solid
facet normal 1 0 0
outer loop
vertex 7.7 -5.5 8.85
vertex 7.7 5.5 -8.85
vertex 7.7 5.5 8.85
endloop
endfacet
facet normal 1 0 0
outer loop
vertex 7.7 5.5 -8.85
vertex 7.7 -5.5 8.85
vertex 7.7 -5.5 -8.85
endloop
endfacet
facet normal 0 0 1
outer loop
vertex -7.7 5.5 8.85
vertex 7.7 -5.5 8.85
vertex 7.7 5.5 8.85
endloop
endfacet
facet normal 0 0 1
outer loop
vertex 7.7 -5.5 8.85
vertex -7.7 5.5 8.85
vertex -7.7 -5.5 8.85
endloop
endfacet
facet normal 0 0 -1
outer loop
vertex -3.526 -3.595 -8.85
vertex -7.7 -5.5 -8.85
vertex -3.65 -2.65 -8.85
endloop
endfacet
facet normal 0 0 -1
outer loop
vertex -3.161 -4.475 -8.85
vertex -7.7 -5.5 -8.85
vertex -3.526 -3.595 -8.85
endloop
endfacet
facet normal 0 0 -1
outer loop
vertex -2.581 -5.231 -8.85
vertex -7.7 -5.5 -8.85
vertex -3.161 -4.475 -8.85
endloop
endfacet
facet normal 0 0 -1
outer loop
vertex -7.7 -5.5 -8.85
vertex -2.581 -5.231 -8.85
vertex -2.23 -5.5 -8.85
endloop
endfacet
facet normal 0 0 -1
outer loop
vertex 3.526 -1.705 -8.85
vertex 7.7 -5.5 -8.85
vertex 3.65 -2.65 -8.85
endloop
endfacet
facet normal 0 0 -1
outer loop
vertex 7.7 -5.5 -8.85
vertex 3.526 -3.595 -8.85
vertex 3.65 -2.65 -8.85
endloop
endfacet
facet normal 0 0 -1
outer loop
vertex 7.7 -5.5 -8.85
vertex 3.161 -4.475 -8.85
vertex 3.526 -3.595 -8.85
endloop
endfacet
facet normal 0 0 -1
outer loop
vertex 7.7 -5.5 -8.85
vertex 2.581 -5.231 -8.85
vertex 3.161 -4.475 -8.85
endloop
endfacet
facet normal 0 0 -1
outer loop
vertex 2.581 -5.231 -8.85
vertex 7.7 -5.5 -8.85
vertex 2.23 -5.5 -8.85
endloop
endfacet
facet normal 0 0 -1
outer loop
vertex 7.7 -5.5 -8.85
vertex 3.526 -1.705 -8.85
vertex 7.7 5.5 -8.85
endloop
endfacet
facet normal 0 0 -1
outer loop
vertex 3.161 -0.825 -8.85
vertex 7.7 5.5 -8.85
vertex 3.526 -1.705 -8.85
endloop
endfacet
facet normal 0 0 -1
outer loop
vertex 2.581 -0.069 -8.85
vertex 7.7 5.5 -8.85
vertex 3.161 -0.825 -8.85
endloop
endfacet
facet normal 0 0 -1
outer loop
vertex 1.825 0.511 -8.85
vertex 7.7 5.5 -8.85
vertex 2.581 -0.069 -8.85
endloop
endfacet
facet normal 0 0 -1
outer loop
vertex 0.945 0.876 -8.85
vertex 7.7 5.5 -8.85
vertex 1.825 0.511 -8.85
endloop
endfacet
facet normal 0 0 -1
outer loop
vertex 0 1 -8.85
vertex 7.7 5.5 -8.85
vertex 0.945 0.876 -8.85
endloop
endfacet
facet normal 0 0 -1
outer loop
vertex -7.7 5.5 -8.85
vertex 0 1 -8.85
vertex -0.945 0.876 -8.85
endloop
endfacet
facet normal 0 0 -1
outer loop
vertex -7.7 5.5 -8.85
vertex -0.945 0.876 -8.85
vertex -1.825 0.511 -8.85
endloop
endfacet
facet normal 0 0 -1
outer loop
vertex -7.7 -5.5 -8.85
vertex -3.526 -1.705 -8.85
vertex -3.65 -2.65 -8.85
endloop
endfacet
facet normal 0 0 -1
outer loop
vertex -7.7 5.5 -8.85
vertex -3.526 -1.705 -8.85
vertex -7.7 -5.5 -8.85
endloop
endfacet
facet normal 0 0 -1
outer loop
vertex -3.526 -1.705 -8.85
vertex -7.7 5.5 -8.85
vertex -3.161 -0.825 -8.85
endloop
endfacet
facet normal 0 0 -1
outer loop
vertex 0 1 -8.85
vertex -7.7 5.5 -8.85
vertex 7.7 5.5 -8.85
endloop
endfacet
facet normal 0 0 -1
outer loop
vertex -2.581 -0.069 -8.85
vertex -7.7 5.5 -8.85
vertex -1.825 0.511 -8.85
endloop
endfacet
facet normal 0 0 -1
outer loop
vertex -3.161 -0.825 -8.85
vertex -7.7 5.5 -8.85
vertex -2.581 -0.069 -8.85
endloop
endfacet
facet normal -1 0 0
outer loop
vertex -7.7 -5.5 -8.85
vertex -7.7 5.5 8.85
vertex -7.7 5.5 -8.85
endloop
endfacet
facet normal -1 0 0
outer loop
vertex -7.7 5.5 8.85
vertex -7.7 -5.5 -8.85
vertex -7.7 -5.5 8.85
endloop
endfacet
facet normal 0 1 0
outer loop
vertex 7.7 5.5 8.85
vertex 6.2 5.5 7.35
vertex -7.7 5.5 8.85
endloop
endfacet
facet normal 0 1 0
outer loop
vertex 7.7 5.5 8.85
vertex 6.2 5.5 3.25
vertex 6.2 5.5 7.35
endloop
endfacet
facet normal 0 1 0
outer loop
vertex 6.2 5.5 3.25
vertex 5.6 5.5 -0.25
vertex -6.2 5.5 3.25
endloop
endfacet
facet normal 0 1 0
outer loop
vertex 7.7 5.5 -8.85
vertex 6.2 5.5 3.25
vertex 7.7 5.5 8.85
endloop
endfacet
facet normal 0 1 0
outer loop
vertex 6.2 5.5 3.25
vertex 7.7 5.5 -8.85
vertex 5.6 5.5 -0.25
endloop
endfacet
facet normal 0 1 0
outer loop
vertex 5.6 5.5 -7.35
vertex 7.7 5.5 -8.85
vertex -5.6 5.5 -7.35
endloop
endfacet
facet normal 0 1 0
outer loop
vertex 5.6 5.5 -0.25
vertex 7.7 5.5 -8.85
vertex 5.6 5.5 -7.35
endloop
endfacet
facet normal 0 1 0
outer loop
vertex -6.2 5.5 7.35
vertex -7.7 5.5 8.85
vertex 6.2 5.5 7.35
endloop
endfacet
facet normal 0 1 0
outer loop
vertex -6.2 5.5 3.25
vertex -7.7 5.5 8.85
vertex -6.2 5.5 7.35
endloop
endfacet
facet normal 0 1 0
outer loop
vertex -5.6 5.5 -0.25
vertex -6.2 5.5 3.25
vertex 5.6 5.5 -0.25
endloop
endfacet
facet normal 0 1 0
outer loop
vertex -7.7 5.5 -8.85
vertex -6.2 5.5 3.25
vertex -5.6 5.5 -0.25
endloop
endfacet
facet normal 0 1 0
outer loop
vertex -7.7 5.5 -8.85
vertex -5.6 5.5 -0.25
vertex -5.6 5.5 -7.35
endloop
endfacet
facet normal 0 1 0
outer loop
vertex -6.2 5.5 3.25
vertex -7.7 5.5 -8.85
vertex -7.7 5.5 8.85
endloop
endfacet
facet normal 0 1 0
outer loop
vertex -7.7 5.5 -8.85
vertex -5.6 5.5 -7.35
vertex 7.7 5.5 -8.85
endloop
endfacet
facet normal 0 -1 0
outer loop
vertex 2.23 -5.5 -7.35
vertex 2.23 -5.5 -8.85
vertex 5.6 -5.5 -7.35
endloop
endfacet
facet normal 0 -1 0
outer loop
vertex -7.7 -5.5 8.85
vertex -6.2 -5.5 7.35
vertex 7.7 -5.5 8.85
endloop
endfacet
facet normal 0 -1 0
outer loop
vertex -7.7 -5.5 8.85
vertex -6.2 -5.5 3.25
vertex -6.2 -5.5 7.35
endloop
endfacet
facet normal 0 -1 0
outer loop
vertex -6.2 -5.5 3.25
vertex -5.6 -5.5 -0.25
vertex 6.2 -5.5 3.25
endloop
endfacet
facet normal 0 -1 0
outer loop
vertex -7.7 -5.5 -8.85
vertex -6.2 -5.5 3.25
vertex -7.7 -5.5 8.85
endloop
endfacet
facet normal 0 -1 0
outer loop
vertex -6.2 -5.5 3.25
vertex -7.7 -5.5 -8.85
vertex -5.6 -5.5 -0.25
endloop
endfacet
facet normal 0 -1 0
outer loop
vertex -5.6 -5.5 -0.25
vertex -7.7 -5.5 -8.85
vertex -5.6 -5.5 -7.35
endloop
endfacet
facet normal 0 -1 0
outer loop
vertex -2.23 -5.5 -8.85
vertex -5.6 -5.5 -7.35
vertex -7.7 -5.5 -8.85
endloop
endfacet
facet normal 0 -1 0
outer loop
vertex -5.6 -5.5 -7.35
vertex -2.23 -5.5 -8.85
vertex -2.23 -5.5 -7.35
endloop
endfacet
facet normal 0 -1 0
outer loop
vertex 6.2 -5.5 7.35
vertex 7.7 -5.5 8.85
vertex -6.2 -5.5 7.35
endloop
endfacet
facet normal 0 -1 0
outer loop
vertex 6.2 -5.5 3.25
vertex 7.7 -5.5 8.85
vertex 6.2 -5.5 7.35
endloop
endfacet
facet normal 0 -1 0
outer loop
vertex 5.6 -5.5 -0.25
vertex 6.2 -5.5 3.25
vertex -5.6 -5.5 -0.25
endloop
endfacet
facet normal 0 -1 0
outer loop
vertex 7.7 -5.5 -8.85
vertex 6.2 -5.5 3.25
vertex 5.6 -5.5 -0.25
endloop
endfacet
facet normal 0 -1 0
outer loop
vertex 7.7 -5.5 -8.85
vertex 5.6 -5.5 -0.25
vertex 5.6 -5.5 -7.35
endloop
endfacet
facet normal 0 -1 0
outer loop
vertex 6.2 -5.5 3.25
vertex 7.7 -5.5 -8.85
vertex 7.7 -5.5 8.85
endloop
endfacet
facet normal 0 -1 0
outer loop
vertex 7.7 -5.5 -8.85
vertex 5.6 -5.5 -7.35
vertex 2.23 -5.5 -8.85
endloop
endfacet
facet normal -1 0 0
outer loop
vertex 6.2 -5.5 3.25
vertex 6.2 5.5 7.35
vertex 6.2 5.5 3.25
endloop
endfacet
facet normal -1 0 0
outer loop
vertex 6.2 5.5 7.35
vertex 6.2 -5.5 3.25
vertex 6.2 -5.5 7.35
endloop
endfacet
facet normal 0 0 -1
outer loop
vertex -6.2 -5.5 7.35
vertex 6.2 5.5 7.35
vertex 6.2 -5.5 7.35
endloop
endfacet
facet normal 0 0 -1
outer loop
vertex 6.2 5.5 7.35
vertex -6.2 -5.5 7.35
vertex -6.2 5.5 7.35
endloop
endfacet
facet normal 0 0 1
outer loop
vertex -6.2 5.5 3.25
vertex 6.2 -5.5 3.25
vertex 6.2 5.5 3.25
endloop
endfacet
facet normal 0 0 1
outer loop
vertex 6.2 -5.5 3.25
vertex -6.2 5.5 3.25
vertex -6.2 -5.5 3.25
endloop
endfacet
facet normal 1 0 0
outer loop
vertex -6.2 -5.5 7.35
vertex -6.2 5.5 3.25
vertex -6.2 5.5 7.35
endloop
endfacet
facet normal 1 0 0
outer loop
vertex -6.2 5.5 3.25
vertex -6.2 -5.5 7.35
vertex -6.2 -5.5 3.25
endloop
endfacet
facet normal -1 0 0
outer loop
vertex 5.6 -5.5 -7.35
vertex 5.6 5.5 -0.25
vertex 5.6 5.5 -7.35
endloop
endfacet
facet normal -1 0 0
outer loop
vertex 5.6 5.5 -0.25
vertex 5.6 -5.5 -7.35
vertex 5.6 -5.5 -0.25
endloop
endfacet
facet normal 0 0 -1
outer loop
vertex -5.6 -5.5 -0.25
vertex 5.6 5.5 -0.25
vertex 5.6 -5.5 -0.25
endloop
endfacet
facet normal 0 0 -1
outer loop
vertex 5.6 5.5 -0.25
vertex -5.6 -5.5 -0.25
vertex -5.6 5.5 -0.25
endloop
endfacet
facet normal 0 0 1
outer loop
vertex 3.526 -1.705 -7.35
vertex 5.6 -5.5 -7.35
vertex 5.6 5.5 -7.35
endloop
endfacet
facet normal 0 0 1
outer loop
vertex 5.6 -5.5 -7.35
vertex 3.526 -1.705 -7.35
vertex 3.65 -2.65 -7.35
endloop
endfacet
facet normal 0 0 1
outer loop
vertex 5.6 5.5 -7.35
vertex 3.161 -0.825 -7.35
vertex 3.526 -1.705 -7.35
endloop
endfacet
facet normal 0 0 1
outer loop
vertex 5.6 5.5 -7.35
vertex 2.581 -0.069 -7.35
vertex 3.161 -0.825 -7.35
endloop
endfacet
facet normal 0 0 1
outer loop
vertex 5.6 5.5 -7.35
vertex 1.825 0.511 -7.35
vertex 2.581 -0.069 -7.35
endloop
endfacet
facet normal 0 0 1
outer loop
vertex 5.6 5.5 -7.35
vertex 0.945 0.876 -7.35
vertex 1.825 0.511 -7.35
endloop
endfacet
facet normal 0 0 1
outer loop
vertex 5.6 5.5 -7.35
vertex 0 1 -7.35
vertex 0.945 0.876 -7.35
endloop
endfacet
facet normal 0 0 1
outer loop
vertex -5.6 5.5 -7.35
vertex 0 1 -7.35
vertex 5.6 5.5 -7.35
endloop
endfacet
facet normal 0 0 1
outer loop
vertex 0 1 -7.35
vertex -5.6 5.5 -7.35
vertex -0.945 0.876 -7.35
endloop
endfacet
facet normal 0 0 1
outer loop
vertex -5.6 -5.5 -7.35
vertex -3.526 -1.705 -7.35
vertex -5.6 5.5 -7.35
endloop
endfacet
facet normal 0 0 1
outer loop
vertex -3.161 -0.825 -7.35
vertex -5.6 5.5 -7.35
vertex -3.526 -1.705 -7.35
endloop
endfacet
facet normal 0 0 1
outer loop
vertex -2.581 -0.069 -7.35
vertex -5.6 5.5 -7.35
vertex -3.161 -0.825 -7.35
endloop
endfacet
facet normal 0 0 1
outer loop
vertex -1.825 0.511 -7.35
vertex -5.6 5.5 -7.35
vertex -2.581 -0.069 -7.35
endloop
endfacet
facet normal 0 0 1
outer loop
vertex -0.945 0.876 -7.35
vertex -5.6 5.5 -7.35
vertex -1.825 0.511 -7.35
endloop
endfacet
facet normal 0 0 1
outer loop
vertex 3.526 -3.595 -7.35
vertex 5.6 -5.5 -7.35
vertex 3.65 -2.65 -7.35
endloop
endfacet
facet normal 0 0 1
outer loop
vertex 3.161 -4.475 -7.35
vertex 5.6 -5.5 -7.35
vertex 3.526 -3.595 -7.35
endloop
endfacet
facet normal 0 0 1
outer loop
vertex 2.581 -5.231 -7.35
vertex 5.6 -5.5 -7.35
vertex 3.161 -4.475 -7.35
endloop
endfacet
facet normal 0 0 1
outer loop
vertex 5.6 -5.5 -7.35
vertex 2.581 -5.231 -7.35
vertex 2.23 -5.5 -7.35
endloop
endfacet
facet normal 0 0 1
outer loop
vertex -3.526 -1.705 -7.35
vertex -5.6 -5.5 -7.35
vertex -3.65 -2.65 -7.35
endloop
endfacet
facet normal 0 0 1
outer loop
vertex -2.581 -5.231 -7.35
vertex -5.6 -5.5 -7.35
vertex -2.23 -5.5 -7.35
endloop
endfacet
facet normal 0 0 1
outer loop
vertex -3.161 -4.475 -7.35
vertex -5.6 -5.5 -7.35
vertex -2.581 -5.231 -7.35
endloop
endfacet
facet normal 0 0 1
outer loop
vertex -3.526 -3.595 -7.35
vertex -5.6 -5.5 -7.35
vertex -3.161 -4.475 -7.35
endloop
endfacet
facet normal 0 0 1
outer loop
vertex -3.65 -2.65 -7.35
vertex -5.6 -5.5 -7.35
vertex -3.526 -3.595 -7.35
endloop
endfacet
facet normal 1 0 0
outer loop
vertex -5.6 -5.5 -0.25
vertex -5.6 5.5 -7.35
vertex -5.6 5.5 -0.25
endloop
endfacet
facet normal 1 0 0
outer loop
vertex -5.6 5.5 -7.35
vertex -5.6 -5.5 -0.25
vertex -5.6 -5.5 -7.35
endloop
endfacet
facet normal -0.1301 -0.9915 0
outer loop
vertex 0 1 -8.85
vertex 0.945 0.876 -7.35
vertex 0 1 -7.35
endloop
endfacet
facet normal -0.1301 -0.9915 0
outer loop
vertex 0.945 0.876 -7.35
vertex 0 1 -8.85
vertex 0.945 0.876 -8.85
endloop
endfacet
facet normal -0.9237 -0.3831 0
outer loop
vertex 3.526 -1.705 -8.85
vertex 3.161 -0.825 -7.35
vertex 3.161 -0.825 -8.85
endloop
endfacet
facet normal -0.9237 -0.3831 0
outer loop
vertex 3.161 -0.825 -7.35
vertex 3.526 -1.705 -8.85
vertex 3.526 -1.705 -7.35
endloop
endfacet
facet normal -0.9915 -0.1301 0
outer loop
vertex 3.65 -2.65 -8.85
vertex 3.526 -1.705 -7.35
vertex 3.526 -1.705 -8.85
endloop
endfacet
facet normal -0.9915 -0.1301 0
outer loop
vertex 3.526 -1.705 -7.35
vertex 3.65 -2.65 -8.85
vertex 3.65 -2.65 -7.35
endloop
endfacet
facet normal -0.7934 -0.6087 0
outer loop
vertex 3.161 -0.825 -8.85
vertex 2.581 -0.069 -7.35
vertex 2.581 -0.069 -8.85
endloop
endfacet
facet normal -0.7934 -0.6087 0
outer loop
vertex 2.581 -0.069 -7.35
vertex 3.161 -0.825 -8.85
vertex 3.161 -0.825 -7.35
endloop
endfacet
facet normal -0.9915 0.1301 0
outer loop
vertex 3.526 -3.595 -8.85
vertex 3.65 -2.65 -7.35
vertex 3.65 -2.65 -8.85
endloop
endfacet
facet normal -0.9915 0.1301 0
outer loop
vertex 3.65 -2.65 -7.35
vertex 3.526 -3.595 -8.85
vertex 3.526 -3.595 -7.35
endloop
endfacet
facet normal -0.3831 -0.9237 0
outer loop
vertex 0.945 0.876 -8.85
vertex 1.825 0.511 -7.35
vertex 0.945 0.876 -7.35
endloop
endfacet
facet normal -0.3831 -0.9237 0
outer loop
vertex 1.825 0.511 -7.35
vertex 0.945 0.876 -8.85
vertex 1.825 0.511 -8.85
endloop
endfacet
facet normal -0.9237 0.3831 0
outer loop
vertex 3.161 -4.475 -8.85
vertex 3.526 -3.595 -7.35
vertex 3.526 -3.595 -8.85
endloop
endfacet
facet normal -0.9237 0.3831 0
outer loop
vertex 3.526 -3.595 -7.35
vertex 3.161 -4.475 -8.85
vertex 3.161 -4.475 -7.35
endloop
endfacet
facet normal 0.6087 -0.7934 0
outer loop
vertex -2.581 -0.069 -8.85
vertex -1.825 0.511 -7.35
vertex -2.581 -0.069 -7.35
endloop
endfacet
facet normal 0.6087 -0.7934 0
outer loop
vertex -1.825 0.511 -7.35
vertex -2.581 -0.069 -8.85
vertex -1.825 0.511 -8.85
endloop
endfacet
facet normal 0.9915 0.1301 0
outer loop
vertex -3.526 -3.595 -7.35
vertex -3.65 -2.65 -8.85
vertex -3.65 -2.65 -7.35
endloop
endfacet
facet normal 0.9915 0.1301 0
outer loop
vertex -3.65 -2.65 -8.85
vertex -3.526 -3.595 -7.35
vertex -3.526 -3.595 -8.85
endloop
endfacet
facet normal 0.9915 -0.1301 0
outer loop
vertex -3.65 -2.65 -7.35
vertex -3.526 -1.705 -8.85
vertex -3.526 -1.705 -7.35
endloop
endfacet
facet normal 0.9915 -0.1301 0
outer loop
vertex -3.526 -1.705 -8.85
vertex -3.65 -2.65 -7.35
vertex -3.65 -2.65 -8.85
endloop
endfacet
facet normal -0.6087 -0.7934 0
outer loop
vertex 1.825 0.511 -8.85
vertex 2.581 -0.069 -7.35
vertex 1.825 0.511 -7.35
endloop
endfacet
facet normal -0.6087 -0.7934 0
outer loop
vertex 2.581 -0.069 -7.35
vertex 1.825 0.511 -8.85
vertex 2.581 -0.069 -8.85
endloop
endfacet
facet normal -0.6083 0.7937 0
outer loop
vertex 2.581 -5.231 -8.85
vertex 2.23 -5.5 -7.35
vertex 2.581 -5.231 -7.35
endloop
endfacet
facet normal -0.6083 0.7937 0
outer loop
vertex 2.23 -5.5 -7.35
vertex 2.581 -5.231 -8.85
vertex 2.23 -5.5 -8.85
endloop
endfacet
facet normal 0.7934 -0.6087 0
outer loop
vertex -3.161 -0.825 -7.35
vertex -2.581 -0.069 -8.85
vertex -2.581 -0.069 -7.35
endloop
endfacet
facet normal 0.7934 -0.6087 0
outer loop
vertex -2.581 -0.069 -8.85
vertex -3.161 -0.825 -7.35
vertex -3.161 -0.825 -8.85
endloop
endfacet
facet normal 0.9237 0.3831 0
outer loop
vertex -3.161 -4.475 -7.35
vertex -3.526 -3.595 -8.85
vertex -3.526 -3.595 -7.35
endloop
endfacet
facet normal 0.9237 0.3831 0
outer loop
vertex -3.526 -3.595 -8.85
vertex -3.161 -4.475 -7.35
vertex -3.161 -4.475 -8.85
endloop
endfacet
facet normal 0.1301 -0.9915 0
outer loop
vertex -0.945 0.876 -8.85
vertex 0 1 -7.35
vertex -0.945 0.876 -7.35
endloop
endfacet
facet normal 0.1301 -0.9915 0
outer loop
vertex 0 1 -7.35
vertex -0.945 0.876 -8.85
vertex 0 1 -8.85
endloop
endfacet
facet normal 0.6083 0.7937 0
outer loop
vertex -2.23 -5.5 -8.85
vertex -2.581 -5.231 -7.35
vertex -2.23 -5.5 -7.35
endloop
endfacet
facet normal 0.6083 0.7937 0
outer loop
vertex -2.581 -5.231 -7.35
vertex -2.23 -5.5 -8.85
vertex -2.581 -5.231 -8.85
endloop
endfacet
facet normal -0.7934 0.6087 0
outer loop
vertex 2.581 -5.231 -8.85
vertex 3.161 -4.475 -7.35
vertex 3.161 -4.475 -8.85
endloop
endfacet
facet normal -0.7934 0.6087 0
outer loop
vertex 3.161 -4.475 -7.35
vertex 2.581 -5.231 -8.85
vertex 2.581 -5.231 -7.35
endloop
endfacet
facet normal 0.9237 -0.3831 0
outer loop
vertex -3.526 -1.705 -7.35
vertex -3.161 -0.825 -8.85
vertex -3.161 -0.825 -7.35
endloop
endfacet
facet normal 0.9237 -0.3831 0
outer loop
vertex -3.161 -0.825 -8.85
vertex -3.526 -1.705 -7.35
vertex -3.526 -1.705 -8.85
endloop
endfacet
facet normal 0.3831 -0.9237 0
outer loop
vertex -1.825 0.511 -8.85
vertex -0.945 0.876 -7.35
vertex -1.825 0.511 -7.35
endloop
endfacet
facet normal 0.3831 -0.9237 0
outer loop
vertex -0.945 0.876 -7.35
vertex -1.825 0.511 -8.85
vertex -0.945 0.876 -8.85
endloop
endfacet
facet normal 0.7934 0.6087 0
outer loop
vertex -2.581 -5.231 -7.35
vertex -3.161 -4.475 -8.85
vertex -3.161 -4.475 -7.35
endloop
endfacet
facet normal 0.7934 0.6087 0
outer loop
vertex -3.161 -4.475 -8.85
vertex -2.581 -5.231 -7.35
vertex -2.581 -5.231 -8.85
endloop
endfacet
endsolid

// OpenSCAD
plug_width = 11.2; //mm
plug_height = 7.1; //mm
cap_width = 12.4; //mm
cap_height = 4.1; //mm
cap_plug_offset = 3.5; //mm
thickness = 1.5; //mm
length = 11; //mm
stem_width = 7.3; //mm
stem_camera_offset = 4.5;

$fn=24;

overall_height = cap_height + cap_plug_offset + plug_height + 2 * thickness;

difference() {
  cube([max(plug_width, cap_width) + 2 * thickness,
        length,
        overall_height],
       center = true);
  translate([0, 0, (overall_height - cap_height) / 2 - thickness]) {
    cube([cap_width, length + 0.01, cap_height], center = true);
  }
  translate([0, 0, -1 * (overall_height - plug_height) / 2 + thickness]) {
    cube([plug_width, length + 0.01, plug_height], center = true);
  }
  translate([0,
             (length - stem_width) / 2 - stem_camera_offset,
             -1 * (overall_height - thickness) / 2]) {
    cylinder(d = stem_width, h = thickness + 0.01, center = true);
  }
}
